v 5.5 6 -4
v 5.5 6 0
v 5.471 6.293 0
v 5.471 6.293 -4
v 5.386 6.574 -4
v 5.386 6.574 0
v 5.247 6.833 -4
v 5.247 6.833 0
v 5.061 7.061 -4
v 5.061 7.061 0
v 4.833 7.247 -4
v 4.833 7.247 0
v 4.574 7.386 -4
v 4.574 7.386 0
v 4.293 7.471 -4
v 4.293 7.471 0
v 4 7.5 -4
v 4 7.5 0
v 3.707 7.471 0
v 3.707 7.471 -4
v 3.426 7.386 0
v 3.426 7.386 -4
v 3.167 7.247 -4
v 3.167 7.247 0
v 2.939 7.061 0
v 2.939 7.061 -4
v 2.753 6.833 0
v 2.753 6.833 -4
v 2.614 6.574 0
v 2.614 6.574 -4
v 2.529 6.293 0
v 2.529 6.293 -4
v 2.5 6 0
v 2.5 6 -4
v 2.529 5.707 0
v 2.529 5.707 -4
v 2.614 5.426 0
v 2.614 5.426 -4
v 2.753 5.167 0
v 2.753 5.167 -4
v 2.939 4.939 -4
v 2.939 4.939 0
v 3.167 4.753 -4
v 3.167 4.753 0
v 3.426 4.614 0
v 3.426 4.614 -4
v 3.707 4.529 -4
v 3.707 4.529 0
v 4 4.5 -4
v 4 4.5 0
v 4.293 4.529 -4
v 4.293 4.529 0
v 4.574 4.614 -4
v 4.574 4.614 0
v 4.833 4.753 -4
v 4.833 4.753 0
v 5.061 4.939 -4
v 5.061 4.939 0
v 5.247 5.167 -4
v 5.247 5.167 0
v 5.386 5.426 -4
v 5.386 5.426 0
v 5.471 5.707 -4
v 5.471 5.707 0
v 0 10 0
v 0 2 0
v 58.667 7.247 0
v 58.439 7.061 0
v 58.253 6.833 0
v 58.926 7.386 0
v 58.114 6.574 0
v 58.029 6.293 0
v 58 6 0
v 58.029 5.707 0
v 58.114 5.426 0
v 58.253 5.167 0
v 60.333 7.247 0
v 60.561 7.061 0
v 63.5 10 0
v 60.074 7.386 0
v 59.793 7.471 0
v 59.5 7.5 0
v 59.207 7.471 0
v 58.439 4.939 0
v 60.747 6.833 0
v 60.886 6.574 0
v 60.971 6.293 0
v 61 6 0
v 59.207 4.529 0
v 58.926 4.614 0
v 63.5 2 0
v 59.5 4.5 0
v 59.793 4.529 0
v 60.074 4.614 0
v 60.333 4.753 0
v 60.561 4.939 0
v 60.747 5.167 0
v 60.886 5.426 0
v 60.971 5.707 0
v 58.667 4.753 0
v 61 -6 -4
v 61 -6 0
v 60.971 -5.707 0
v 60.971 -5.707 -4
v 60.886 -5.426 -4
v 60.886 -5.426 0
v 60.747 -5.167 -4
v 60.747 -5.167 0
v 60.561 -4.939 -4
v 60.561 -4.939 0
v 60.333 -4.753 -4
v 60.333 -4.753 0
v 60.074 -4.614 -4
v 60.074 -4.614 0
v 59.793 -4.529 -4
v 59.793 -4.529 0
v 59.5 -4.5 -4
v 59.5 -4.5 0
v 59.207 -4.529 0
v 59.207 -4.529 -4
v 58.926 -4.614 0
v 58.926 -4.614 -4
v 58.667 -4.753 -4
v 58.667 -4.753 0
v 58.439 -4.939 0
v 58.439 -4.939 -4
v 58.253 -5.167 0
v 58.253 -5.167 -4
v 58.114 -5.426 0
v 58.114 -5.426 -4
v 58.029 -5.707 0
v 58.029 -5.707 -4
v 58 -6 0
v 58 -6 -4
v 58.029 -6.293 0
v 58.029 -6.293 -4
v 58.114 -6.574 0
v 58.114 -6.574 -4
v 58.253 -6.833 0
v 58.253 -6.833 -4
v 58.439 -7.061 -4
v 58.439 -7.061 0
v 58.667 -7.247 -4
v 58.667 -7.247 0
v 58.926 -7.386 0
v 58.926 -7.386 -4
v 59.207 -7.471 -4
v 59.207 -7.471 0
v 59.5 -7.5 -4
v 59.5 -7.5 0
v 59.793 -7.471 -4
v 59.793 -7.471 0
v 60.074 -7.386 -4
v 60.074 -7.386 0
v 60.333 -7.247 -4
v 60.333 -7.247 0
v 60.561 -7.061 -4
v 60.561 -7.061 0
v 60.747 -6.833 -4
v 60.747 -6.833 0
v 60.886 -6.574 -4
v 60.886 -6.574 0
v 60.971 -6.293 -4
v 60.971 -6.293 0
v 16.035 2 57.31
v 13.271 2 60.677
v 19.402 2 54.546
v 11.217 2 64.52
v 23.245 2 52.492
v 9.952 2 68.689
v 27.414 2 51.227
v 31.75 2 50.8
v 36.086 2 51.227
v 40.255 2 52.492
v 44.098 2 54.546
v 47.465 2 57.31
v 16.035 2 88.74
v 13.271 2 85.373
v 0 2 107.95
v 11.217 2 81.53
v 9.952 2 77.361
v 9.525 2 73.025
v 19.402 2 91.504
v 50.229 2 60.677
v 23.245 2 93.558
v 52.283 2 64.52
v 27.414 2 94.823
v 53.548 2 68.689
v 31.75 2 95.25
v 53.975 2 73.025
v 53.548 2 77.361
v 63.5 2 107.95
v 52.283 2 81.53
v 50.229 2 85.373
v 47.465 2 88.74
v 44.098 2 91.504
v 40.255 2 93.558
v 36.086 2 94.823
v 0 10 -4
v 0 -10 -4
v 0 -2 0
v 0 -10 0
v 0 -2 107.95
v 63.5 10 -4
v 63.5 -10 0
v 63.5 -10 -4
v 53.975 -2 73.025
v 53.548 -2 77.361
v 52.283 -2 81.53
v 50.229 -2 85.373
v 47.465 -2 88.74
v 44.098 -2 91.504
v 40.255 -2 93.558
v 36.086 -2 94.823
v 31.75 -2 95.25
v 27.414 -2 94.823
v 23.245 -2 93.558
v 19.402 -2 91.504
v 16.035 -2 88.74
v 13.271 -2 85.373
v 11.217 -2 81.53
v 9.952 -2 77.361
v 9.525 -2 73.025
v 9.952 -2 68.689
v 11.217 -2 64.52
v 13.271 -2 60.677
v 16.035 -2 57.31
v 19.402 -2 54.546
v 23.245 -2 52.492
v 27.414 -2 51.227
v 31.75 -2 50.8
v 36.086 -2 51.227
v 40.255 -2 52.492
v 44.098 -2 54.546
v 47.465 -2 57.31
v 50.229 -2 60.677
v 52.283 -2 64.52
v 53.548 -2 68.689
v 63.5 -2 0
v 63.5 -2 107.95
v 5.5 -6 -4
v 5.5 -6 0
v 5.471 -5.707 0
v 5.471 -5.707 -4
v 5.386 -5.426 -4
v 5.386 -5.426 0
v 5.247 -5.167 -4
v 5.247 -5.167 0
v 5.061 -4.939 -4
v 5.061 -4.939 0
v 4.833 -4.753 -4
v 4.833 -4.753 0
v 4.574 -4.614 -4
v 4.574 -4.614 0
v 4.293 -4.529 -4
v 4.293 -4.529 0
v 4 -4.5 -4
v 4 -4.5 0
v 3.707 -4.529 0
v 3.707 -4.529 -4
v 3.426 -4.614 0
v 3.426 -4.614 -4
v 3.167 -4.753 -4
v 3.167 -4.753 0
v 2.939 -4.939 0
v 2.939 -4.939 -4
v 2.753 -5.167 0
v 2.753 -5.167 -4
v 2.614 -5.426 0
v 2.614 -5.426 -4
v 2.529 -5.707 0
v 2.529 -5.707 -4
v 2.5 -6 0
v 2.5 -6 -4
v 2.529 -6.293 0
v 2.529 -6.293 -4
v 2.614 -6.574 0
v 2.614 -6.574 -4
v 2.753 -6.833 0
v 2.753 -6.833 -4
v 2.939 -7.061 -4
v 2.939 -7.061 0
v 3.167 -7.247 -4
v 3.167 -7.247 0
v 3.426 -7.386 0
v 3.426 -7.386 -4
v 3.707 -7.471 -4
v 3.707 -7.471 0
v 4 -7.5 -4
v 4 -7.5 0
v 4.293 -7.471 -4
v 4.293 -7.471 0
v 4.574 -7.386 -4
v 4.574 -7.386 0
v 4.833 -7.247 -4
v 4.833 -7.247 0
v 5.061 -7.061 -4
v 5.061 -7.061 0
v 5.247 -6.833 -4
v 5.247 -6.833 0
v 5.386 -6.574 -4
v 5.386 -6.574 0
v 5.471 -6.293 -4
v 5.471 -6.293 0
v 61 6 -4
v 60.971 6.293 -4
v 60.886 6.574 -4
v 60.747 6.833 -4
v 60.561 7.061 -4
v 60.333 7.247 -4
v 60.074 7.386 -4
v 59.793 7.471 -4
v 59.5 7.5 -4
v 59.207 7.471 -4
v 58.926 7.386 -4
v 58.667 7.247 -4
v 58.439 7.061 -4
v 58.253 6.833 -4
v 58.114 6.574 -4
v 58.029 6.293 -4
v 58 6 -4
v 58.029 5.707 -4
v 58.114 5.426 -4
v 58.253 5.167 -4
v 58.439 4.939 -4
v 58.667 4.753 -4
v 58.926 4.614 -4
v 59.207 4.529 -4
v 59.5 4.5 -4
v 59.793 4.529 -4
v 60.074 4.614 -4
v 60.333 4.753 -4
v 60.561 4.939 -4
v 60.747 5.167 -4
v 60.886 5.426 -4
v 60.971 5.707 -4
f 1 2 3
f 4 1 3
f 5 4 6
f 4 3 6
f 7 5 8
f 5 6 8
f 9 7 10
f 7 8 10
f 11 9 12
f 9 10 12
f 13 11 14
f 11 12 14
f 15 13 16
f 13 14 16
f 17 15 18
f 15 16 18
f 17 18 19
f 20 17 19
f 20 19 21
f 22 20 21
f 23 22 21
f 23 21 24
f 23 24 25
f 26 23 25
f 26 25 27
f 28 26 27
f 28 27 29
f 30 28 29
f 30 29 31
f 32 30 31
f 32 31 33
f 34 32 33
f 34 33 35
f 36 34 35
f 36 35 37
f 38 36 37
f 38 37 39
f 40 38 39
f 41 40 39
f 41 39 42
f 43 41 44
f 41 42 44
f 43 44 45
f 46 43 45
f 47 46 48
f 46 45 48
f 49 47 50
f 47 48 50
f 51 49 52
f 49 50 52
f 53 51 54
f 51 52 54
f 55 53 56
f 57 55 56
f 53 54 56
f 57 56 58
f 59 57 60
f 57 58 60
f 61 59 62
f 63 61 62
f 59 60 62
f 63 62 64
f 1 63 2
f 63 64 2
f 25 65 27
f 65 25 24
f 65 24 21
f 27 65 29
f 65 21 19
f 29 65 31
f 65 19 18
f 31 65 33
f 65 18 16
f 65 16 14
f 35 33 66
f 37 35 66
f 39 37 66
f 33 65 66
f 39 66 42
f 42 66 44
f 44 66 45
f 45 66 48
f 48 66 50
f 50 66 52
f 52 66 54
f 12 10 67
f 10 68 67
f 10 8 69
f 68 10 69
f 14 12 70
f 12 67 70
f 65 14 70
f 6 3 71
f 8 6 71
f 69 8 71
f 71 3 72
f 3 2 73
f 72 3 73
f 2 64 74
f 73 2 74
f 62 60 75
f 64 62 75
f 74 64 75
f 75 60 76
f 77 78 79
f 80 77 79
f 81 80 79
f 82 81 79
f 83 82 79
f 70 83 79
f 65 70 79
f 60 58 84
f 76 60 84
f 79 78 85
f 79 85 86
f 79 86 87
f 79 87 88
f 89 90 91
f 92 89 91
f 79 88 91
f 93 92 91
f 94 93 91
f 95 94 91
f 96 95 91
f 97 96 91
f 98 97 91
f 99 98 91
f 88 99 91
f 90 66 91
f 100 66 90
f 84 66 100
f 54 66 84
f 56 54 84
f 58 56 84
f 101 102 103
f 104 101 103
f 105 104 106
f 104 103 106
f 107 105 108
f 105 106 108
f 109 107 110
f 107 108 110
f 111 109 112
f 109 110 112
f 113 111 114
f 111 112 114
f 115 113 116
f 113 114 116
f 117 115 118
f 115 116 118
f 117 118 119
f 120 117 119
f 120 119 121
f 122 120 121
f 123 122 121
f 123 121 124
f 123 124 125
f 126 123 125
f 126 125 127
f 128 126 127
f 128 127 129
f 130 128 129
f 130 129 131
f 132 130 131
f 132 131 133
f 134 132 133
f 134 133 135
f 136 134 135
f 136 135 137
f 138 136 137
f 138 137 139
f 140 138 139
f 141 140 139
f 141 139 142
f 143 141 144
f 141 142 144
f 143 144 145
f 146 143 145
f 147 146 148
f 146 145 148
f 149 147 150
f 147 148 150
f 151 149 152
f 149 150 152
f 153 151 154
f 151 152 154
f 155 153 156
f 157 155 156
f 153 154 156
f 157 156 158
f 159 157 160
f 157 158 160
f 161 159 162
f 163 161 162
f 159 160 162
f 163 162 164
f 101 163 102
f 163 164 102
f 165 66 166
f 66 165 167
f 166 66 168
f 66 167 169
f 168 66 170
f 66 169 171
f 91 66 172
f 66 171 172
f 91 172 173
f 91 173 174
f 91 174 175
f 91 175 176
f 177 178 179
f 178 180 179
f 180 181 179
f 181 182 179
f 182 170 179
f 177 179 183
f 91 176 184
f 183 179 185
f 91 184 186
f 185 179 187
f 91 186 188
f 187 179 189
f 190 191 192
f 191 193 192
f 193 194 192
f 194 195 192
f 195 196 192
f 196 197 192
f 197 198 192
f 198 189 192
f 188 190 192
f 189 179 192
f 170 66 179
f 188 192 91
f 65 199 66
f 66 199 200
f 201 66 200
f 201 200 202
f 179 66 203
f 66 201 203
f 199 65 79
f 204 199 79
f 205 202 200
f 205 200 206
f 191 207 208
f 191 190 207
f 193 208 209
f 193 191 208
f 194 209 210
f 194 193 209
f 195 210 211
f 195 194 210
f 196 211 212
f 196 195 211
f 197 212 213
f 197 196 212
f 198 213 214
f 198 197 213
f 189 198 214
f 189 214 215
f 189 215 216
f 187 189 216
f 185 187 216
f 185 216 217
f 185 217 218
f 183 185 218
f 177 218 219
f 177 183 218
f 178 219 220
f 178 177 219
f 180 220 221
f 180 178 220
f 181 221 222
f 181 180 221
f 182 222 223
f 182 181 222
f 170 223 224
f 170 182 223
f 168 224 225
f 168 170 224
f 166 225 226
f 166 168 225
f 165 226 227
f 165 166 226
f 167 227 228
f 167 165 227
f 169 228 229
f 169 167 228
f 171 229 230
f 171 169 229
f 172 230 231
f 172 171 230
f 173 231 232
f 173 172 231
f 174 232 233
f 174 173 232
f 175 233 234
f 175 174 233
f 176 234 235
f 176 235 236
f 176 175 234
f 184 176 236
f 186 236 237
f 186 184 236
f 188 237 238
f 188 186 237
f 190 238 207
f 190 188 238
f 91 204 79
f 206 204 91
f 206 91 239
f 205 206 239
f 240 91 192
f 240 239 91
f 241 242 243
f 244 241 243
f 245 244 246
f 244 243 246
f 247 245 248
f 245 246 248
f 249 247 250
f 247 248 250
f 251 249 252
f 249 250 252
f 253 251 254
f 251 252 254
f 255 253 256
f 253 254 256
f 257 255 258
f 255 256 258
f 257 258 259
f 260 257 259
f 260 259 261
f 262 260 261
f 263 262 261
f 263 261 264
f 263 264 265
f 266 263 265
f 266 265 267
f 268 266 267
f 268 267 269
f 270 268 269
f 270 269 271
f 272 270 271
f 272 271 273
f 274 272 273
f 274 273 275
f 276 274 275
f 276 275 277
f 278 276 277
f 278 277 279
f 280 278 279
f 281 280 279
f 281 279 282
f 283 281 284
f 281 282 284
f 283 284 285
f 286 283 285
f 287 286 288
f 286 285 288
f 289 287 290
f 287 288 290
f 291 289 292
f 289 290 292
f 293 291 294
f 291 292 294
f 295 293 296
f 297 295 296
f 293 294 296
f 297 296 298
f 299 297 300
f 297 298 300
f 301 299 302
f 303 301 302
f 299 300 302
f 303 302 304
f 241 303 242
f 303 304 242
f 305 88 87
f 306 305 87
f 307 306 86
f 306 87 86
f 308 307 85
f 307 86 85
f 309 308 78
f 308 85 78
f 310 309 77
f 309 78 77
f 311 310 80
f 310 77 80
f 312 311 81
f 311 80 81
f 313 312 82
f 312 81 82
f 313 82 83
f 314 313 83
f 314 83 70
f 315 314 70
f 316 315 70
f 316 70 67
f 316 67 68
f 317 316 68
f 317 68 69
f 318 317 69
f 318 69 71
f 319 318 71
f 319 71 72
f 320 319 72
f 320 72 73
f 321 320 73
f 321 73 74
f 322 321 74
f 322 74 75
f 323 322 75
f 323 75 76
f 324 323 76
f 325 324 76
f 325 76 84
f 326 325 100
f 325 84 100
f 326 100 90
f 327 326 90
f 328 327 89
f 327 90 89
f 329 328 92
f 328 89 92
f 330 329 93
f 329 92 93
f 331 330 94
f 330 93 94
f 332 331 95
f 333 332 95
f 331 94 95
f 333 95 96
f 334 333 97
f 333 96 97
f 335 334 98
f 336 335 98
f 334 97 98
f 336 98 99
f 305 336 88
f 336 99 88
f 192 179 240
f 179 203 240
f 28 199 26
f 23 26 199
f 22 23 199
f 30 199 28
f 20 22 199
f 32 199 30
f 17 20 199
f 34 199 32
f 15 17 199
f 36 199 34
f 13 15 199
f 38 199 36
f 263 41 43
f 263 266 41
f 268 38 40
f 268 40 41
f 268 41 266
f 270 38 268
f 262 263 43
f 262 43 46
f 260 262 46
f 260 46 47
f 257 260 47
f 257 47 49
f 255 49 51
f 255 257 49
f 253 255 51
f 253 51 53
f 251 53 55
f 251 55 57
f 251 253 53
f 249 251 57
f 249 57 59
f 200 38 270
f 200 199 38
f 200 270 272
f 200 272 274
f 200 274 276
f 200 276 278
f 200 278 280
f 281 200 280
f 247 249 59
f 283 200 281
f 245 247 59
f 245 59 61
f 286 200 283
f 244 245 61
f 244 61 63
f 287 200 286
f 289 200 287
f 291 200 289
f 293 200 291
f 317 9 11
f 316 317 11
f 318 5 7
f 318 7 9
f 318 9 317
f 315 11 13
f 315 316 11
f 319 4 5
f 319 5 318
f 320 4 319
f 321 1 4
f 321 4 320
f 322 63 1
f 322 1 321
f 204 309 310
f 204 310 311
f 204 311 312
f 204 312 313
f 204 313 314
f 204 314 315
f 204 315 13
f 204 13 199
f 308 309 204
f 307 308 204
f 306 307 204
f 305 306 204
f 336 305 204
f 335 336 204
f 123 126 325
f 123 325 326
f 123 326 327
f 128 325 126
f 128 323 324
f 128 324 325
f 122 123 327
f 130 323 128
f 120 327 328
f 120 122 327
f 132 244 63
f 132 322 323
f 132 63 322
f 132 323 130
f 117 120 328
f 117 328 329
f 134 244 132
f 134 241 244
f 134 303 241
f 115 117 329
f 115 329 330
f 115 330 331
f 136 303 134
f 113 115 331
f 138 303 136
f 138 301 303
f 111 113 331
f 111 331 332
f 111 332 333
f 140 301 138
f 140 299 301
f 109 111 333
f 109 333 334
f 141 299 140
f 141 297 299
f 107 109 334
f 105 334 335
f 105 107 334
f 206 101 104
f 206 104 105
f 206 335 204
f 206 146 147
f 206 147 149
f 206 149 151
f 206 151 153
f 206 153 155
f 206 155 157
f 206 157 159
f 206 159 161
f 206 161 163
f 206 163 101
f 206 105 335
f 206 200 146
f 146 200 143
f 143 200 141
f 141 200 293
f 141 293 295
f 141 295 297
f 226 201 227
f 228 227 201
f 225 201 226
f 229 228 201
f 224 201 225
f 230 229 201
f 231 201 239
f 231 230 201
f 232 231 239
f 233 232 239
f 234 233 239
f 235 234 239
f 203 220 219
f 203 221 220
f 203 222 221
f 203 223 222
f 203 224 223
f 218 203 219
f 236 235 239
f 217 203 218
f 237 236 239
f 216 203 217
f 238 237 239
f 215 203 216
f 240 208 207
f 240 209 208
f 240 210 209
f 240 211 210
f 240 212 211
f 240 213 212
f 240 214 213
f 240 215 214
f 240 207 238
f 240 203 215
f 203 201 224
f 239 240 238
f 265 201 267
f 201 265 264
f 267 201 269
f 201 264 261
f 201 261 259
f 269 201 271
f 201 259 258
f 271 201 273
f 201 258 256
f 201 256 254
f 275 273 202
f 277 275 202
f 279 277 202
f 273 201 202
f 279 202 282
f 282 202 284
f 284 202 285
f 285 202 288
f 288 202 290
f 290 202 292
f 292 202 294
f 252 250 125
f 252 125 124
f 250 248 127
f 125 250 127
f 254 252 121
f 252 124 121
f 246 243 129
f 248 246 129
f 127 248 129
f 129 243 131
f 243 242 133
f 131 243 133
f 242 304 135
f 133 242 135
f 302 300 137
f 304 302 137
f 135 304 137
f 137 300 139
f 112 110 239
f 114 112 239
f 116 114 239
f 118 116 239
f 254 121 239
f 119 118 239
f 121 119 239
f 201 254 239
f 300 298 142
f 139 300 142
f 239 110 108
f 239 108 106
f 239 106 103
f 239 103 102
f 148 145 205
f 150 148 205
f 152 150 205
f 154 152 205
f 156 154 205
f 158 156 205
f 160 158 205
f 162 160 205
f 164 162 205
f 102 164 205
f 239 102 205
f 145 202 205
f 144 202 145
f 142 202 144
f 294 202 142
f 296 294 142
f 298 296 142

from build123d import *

# Parameters (mm, degrees)
F0_W     = 63.5
F0_H     = 107.95
F0_R     = 22.225
F1_DEPTH = 2
F2_W     = 63.5
F2_H     = 4
F3_DEPTH = 10
F4_R     = 1.5
F5_DEPTH = 25
F6_R     = 1.5
F7_DEPTH = 25


with BuildPart() as f1:
    # F0 (on Front) → F1 (new body, symmetric)
    with BuildSketch(Plane.XZ):
        with Locations((31.75, 53.975)):
            Rectangle(F0_W, F0_H)
        with Locations((31.75, 73.025)):
            Circle(F0_R, mode=Mode.SUBTRACT)
    extrude(amount=F1_DEPTH, both=True)

    # F2 (on Front) → F3 (join, symmetric)
    with BuildSketch(Plane.XZ):
        with Locations((31.75, -2)):
            Rectangle(F2_W, F2_H)
    extrude(amount=F3_DEPTH, both=True)

    # F4 (on face) → F5 (cut)
    with BuildSketch(Plane.XY):
        with Locations((4, 6)):
            Circle(F4_R)
        with Locations((59.5, 6)):
            Circle(F4_R)
    extrude(amount=-F5_DEPTH, mode=Mode.SUBTRACT)

    # F6 (on face) → F7 (cut)
    with BuildSketch(Plane.XY):
        with Locations((4, -6)):
            Circle(F6_R)
        with Locations((59.5, -6)):
            Circle(F6_R)
    extrude(amount=-F7_DEPTH, mode=Mode.SUBTRACT)


solid = f1.part
